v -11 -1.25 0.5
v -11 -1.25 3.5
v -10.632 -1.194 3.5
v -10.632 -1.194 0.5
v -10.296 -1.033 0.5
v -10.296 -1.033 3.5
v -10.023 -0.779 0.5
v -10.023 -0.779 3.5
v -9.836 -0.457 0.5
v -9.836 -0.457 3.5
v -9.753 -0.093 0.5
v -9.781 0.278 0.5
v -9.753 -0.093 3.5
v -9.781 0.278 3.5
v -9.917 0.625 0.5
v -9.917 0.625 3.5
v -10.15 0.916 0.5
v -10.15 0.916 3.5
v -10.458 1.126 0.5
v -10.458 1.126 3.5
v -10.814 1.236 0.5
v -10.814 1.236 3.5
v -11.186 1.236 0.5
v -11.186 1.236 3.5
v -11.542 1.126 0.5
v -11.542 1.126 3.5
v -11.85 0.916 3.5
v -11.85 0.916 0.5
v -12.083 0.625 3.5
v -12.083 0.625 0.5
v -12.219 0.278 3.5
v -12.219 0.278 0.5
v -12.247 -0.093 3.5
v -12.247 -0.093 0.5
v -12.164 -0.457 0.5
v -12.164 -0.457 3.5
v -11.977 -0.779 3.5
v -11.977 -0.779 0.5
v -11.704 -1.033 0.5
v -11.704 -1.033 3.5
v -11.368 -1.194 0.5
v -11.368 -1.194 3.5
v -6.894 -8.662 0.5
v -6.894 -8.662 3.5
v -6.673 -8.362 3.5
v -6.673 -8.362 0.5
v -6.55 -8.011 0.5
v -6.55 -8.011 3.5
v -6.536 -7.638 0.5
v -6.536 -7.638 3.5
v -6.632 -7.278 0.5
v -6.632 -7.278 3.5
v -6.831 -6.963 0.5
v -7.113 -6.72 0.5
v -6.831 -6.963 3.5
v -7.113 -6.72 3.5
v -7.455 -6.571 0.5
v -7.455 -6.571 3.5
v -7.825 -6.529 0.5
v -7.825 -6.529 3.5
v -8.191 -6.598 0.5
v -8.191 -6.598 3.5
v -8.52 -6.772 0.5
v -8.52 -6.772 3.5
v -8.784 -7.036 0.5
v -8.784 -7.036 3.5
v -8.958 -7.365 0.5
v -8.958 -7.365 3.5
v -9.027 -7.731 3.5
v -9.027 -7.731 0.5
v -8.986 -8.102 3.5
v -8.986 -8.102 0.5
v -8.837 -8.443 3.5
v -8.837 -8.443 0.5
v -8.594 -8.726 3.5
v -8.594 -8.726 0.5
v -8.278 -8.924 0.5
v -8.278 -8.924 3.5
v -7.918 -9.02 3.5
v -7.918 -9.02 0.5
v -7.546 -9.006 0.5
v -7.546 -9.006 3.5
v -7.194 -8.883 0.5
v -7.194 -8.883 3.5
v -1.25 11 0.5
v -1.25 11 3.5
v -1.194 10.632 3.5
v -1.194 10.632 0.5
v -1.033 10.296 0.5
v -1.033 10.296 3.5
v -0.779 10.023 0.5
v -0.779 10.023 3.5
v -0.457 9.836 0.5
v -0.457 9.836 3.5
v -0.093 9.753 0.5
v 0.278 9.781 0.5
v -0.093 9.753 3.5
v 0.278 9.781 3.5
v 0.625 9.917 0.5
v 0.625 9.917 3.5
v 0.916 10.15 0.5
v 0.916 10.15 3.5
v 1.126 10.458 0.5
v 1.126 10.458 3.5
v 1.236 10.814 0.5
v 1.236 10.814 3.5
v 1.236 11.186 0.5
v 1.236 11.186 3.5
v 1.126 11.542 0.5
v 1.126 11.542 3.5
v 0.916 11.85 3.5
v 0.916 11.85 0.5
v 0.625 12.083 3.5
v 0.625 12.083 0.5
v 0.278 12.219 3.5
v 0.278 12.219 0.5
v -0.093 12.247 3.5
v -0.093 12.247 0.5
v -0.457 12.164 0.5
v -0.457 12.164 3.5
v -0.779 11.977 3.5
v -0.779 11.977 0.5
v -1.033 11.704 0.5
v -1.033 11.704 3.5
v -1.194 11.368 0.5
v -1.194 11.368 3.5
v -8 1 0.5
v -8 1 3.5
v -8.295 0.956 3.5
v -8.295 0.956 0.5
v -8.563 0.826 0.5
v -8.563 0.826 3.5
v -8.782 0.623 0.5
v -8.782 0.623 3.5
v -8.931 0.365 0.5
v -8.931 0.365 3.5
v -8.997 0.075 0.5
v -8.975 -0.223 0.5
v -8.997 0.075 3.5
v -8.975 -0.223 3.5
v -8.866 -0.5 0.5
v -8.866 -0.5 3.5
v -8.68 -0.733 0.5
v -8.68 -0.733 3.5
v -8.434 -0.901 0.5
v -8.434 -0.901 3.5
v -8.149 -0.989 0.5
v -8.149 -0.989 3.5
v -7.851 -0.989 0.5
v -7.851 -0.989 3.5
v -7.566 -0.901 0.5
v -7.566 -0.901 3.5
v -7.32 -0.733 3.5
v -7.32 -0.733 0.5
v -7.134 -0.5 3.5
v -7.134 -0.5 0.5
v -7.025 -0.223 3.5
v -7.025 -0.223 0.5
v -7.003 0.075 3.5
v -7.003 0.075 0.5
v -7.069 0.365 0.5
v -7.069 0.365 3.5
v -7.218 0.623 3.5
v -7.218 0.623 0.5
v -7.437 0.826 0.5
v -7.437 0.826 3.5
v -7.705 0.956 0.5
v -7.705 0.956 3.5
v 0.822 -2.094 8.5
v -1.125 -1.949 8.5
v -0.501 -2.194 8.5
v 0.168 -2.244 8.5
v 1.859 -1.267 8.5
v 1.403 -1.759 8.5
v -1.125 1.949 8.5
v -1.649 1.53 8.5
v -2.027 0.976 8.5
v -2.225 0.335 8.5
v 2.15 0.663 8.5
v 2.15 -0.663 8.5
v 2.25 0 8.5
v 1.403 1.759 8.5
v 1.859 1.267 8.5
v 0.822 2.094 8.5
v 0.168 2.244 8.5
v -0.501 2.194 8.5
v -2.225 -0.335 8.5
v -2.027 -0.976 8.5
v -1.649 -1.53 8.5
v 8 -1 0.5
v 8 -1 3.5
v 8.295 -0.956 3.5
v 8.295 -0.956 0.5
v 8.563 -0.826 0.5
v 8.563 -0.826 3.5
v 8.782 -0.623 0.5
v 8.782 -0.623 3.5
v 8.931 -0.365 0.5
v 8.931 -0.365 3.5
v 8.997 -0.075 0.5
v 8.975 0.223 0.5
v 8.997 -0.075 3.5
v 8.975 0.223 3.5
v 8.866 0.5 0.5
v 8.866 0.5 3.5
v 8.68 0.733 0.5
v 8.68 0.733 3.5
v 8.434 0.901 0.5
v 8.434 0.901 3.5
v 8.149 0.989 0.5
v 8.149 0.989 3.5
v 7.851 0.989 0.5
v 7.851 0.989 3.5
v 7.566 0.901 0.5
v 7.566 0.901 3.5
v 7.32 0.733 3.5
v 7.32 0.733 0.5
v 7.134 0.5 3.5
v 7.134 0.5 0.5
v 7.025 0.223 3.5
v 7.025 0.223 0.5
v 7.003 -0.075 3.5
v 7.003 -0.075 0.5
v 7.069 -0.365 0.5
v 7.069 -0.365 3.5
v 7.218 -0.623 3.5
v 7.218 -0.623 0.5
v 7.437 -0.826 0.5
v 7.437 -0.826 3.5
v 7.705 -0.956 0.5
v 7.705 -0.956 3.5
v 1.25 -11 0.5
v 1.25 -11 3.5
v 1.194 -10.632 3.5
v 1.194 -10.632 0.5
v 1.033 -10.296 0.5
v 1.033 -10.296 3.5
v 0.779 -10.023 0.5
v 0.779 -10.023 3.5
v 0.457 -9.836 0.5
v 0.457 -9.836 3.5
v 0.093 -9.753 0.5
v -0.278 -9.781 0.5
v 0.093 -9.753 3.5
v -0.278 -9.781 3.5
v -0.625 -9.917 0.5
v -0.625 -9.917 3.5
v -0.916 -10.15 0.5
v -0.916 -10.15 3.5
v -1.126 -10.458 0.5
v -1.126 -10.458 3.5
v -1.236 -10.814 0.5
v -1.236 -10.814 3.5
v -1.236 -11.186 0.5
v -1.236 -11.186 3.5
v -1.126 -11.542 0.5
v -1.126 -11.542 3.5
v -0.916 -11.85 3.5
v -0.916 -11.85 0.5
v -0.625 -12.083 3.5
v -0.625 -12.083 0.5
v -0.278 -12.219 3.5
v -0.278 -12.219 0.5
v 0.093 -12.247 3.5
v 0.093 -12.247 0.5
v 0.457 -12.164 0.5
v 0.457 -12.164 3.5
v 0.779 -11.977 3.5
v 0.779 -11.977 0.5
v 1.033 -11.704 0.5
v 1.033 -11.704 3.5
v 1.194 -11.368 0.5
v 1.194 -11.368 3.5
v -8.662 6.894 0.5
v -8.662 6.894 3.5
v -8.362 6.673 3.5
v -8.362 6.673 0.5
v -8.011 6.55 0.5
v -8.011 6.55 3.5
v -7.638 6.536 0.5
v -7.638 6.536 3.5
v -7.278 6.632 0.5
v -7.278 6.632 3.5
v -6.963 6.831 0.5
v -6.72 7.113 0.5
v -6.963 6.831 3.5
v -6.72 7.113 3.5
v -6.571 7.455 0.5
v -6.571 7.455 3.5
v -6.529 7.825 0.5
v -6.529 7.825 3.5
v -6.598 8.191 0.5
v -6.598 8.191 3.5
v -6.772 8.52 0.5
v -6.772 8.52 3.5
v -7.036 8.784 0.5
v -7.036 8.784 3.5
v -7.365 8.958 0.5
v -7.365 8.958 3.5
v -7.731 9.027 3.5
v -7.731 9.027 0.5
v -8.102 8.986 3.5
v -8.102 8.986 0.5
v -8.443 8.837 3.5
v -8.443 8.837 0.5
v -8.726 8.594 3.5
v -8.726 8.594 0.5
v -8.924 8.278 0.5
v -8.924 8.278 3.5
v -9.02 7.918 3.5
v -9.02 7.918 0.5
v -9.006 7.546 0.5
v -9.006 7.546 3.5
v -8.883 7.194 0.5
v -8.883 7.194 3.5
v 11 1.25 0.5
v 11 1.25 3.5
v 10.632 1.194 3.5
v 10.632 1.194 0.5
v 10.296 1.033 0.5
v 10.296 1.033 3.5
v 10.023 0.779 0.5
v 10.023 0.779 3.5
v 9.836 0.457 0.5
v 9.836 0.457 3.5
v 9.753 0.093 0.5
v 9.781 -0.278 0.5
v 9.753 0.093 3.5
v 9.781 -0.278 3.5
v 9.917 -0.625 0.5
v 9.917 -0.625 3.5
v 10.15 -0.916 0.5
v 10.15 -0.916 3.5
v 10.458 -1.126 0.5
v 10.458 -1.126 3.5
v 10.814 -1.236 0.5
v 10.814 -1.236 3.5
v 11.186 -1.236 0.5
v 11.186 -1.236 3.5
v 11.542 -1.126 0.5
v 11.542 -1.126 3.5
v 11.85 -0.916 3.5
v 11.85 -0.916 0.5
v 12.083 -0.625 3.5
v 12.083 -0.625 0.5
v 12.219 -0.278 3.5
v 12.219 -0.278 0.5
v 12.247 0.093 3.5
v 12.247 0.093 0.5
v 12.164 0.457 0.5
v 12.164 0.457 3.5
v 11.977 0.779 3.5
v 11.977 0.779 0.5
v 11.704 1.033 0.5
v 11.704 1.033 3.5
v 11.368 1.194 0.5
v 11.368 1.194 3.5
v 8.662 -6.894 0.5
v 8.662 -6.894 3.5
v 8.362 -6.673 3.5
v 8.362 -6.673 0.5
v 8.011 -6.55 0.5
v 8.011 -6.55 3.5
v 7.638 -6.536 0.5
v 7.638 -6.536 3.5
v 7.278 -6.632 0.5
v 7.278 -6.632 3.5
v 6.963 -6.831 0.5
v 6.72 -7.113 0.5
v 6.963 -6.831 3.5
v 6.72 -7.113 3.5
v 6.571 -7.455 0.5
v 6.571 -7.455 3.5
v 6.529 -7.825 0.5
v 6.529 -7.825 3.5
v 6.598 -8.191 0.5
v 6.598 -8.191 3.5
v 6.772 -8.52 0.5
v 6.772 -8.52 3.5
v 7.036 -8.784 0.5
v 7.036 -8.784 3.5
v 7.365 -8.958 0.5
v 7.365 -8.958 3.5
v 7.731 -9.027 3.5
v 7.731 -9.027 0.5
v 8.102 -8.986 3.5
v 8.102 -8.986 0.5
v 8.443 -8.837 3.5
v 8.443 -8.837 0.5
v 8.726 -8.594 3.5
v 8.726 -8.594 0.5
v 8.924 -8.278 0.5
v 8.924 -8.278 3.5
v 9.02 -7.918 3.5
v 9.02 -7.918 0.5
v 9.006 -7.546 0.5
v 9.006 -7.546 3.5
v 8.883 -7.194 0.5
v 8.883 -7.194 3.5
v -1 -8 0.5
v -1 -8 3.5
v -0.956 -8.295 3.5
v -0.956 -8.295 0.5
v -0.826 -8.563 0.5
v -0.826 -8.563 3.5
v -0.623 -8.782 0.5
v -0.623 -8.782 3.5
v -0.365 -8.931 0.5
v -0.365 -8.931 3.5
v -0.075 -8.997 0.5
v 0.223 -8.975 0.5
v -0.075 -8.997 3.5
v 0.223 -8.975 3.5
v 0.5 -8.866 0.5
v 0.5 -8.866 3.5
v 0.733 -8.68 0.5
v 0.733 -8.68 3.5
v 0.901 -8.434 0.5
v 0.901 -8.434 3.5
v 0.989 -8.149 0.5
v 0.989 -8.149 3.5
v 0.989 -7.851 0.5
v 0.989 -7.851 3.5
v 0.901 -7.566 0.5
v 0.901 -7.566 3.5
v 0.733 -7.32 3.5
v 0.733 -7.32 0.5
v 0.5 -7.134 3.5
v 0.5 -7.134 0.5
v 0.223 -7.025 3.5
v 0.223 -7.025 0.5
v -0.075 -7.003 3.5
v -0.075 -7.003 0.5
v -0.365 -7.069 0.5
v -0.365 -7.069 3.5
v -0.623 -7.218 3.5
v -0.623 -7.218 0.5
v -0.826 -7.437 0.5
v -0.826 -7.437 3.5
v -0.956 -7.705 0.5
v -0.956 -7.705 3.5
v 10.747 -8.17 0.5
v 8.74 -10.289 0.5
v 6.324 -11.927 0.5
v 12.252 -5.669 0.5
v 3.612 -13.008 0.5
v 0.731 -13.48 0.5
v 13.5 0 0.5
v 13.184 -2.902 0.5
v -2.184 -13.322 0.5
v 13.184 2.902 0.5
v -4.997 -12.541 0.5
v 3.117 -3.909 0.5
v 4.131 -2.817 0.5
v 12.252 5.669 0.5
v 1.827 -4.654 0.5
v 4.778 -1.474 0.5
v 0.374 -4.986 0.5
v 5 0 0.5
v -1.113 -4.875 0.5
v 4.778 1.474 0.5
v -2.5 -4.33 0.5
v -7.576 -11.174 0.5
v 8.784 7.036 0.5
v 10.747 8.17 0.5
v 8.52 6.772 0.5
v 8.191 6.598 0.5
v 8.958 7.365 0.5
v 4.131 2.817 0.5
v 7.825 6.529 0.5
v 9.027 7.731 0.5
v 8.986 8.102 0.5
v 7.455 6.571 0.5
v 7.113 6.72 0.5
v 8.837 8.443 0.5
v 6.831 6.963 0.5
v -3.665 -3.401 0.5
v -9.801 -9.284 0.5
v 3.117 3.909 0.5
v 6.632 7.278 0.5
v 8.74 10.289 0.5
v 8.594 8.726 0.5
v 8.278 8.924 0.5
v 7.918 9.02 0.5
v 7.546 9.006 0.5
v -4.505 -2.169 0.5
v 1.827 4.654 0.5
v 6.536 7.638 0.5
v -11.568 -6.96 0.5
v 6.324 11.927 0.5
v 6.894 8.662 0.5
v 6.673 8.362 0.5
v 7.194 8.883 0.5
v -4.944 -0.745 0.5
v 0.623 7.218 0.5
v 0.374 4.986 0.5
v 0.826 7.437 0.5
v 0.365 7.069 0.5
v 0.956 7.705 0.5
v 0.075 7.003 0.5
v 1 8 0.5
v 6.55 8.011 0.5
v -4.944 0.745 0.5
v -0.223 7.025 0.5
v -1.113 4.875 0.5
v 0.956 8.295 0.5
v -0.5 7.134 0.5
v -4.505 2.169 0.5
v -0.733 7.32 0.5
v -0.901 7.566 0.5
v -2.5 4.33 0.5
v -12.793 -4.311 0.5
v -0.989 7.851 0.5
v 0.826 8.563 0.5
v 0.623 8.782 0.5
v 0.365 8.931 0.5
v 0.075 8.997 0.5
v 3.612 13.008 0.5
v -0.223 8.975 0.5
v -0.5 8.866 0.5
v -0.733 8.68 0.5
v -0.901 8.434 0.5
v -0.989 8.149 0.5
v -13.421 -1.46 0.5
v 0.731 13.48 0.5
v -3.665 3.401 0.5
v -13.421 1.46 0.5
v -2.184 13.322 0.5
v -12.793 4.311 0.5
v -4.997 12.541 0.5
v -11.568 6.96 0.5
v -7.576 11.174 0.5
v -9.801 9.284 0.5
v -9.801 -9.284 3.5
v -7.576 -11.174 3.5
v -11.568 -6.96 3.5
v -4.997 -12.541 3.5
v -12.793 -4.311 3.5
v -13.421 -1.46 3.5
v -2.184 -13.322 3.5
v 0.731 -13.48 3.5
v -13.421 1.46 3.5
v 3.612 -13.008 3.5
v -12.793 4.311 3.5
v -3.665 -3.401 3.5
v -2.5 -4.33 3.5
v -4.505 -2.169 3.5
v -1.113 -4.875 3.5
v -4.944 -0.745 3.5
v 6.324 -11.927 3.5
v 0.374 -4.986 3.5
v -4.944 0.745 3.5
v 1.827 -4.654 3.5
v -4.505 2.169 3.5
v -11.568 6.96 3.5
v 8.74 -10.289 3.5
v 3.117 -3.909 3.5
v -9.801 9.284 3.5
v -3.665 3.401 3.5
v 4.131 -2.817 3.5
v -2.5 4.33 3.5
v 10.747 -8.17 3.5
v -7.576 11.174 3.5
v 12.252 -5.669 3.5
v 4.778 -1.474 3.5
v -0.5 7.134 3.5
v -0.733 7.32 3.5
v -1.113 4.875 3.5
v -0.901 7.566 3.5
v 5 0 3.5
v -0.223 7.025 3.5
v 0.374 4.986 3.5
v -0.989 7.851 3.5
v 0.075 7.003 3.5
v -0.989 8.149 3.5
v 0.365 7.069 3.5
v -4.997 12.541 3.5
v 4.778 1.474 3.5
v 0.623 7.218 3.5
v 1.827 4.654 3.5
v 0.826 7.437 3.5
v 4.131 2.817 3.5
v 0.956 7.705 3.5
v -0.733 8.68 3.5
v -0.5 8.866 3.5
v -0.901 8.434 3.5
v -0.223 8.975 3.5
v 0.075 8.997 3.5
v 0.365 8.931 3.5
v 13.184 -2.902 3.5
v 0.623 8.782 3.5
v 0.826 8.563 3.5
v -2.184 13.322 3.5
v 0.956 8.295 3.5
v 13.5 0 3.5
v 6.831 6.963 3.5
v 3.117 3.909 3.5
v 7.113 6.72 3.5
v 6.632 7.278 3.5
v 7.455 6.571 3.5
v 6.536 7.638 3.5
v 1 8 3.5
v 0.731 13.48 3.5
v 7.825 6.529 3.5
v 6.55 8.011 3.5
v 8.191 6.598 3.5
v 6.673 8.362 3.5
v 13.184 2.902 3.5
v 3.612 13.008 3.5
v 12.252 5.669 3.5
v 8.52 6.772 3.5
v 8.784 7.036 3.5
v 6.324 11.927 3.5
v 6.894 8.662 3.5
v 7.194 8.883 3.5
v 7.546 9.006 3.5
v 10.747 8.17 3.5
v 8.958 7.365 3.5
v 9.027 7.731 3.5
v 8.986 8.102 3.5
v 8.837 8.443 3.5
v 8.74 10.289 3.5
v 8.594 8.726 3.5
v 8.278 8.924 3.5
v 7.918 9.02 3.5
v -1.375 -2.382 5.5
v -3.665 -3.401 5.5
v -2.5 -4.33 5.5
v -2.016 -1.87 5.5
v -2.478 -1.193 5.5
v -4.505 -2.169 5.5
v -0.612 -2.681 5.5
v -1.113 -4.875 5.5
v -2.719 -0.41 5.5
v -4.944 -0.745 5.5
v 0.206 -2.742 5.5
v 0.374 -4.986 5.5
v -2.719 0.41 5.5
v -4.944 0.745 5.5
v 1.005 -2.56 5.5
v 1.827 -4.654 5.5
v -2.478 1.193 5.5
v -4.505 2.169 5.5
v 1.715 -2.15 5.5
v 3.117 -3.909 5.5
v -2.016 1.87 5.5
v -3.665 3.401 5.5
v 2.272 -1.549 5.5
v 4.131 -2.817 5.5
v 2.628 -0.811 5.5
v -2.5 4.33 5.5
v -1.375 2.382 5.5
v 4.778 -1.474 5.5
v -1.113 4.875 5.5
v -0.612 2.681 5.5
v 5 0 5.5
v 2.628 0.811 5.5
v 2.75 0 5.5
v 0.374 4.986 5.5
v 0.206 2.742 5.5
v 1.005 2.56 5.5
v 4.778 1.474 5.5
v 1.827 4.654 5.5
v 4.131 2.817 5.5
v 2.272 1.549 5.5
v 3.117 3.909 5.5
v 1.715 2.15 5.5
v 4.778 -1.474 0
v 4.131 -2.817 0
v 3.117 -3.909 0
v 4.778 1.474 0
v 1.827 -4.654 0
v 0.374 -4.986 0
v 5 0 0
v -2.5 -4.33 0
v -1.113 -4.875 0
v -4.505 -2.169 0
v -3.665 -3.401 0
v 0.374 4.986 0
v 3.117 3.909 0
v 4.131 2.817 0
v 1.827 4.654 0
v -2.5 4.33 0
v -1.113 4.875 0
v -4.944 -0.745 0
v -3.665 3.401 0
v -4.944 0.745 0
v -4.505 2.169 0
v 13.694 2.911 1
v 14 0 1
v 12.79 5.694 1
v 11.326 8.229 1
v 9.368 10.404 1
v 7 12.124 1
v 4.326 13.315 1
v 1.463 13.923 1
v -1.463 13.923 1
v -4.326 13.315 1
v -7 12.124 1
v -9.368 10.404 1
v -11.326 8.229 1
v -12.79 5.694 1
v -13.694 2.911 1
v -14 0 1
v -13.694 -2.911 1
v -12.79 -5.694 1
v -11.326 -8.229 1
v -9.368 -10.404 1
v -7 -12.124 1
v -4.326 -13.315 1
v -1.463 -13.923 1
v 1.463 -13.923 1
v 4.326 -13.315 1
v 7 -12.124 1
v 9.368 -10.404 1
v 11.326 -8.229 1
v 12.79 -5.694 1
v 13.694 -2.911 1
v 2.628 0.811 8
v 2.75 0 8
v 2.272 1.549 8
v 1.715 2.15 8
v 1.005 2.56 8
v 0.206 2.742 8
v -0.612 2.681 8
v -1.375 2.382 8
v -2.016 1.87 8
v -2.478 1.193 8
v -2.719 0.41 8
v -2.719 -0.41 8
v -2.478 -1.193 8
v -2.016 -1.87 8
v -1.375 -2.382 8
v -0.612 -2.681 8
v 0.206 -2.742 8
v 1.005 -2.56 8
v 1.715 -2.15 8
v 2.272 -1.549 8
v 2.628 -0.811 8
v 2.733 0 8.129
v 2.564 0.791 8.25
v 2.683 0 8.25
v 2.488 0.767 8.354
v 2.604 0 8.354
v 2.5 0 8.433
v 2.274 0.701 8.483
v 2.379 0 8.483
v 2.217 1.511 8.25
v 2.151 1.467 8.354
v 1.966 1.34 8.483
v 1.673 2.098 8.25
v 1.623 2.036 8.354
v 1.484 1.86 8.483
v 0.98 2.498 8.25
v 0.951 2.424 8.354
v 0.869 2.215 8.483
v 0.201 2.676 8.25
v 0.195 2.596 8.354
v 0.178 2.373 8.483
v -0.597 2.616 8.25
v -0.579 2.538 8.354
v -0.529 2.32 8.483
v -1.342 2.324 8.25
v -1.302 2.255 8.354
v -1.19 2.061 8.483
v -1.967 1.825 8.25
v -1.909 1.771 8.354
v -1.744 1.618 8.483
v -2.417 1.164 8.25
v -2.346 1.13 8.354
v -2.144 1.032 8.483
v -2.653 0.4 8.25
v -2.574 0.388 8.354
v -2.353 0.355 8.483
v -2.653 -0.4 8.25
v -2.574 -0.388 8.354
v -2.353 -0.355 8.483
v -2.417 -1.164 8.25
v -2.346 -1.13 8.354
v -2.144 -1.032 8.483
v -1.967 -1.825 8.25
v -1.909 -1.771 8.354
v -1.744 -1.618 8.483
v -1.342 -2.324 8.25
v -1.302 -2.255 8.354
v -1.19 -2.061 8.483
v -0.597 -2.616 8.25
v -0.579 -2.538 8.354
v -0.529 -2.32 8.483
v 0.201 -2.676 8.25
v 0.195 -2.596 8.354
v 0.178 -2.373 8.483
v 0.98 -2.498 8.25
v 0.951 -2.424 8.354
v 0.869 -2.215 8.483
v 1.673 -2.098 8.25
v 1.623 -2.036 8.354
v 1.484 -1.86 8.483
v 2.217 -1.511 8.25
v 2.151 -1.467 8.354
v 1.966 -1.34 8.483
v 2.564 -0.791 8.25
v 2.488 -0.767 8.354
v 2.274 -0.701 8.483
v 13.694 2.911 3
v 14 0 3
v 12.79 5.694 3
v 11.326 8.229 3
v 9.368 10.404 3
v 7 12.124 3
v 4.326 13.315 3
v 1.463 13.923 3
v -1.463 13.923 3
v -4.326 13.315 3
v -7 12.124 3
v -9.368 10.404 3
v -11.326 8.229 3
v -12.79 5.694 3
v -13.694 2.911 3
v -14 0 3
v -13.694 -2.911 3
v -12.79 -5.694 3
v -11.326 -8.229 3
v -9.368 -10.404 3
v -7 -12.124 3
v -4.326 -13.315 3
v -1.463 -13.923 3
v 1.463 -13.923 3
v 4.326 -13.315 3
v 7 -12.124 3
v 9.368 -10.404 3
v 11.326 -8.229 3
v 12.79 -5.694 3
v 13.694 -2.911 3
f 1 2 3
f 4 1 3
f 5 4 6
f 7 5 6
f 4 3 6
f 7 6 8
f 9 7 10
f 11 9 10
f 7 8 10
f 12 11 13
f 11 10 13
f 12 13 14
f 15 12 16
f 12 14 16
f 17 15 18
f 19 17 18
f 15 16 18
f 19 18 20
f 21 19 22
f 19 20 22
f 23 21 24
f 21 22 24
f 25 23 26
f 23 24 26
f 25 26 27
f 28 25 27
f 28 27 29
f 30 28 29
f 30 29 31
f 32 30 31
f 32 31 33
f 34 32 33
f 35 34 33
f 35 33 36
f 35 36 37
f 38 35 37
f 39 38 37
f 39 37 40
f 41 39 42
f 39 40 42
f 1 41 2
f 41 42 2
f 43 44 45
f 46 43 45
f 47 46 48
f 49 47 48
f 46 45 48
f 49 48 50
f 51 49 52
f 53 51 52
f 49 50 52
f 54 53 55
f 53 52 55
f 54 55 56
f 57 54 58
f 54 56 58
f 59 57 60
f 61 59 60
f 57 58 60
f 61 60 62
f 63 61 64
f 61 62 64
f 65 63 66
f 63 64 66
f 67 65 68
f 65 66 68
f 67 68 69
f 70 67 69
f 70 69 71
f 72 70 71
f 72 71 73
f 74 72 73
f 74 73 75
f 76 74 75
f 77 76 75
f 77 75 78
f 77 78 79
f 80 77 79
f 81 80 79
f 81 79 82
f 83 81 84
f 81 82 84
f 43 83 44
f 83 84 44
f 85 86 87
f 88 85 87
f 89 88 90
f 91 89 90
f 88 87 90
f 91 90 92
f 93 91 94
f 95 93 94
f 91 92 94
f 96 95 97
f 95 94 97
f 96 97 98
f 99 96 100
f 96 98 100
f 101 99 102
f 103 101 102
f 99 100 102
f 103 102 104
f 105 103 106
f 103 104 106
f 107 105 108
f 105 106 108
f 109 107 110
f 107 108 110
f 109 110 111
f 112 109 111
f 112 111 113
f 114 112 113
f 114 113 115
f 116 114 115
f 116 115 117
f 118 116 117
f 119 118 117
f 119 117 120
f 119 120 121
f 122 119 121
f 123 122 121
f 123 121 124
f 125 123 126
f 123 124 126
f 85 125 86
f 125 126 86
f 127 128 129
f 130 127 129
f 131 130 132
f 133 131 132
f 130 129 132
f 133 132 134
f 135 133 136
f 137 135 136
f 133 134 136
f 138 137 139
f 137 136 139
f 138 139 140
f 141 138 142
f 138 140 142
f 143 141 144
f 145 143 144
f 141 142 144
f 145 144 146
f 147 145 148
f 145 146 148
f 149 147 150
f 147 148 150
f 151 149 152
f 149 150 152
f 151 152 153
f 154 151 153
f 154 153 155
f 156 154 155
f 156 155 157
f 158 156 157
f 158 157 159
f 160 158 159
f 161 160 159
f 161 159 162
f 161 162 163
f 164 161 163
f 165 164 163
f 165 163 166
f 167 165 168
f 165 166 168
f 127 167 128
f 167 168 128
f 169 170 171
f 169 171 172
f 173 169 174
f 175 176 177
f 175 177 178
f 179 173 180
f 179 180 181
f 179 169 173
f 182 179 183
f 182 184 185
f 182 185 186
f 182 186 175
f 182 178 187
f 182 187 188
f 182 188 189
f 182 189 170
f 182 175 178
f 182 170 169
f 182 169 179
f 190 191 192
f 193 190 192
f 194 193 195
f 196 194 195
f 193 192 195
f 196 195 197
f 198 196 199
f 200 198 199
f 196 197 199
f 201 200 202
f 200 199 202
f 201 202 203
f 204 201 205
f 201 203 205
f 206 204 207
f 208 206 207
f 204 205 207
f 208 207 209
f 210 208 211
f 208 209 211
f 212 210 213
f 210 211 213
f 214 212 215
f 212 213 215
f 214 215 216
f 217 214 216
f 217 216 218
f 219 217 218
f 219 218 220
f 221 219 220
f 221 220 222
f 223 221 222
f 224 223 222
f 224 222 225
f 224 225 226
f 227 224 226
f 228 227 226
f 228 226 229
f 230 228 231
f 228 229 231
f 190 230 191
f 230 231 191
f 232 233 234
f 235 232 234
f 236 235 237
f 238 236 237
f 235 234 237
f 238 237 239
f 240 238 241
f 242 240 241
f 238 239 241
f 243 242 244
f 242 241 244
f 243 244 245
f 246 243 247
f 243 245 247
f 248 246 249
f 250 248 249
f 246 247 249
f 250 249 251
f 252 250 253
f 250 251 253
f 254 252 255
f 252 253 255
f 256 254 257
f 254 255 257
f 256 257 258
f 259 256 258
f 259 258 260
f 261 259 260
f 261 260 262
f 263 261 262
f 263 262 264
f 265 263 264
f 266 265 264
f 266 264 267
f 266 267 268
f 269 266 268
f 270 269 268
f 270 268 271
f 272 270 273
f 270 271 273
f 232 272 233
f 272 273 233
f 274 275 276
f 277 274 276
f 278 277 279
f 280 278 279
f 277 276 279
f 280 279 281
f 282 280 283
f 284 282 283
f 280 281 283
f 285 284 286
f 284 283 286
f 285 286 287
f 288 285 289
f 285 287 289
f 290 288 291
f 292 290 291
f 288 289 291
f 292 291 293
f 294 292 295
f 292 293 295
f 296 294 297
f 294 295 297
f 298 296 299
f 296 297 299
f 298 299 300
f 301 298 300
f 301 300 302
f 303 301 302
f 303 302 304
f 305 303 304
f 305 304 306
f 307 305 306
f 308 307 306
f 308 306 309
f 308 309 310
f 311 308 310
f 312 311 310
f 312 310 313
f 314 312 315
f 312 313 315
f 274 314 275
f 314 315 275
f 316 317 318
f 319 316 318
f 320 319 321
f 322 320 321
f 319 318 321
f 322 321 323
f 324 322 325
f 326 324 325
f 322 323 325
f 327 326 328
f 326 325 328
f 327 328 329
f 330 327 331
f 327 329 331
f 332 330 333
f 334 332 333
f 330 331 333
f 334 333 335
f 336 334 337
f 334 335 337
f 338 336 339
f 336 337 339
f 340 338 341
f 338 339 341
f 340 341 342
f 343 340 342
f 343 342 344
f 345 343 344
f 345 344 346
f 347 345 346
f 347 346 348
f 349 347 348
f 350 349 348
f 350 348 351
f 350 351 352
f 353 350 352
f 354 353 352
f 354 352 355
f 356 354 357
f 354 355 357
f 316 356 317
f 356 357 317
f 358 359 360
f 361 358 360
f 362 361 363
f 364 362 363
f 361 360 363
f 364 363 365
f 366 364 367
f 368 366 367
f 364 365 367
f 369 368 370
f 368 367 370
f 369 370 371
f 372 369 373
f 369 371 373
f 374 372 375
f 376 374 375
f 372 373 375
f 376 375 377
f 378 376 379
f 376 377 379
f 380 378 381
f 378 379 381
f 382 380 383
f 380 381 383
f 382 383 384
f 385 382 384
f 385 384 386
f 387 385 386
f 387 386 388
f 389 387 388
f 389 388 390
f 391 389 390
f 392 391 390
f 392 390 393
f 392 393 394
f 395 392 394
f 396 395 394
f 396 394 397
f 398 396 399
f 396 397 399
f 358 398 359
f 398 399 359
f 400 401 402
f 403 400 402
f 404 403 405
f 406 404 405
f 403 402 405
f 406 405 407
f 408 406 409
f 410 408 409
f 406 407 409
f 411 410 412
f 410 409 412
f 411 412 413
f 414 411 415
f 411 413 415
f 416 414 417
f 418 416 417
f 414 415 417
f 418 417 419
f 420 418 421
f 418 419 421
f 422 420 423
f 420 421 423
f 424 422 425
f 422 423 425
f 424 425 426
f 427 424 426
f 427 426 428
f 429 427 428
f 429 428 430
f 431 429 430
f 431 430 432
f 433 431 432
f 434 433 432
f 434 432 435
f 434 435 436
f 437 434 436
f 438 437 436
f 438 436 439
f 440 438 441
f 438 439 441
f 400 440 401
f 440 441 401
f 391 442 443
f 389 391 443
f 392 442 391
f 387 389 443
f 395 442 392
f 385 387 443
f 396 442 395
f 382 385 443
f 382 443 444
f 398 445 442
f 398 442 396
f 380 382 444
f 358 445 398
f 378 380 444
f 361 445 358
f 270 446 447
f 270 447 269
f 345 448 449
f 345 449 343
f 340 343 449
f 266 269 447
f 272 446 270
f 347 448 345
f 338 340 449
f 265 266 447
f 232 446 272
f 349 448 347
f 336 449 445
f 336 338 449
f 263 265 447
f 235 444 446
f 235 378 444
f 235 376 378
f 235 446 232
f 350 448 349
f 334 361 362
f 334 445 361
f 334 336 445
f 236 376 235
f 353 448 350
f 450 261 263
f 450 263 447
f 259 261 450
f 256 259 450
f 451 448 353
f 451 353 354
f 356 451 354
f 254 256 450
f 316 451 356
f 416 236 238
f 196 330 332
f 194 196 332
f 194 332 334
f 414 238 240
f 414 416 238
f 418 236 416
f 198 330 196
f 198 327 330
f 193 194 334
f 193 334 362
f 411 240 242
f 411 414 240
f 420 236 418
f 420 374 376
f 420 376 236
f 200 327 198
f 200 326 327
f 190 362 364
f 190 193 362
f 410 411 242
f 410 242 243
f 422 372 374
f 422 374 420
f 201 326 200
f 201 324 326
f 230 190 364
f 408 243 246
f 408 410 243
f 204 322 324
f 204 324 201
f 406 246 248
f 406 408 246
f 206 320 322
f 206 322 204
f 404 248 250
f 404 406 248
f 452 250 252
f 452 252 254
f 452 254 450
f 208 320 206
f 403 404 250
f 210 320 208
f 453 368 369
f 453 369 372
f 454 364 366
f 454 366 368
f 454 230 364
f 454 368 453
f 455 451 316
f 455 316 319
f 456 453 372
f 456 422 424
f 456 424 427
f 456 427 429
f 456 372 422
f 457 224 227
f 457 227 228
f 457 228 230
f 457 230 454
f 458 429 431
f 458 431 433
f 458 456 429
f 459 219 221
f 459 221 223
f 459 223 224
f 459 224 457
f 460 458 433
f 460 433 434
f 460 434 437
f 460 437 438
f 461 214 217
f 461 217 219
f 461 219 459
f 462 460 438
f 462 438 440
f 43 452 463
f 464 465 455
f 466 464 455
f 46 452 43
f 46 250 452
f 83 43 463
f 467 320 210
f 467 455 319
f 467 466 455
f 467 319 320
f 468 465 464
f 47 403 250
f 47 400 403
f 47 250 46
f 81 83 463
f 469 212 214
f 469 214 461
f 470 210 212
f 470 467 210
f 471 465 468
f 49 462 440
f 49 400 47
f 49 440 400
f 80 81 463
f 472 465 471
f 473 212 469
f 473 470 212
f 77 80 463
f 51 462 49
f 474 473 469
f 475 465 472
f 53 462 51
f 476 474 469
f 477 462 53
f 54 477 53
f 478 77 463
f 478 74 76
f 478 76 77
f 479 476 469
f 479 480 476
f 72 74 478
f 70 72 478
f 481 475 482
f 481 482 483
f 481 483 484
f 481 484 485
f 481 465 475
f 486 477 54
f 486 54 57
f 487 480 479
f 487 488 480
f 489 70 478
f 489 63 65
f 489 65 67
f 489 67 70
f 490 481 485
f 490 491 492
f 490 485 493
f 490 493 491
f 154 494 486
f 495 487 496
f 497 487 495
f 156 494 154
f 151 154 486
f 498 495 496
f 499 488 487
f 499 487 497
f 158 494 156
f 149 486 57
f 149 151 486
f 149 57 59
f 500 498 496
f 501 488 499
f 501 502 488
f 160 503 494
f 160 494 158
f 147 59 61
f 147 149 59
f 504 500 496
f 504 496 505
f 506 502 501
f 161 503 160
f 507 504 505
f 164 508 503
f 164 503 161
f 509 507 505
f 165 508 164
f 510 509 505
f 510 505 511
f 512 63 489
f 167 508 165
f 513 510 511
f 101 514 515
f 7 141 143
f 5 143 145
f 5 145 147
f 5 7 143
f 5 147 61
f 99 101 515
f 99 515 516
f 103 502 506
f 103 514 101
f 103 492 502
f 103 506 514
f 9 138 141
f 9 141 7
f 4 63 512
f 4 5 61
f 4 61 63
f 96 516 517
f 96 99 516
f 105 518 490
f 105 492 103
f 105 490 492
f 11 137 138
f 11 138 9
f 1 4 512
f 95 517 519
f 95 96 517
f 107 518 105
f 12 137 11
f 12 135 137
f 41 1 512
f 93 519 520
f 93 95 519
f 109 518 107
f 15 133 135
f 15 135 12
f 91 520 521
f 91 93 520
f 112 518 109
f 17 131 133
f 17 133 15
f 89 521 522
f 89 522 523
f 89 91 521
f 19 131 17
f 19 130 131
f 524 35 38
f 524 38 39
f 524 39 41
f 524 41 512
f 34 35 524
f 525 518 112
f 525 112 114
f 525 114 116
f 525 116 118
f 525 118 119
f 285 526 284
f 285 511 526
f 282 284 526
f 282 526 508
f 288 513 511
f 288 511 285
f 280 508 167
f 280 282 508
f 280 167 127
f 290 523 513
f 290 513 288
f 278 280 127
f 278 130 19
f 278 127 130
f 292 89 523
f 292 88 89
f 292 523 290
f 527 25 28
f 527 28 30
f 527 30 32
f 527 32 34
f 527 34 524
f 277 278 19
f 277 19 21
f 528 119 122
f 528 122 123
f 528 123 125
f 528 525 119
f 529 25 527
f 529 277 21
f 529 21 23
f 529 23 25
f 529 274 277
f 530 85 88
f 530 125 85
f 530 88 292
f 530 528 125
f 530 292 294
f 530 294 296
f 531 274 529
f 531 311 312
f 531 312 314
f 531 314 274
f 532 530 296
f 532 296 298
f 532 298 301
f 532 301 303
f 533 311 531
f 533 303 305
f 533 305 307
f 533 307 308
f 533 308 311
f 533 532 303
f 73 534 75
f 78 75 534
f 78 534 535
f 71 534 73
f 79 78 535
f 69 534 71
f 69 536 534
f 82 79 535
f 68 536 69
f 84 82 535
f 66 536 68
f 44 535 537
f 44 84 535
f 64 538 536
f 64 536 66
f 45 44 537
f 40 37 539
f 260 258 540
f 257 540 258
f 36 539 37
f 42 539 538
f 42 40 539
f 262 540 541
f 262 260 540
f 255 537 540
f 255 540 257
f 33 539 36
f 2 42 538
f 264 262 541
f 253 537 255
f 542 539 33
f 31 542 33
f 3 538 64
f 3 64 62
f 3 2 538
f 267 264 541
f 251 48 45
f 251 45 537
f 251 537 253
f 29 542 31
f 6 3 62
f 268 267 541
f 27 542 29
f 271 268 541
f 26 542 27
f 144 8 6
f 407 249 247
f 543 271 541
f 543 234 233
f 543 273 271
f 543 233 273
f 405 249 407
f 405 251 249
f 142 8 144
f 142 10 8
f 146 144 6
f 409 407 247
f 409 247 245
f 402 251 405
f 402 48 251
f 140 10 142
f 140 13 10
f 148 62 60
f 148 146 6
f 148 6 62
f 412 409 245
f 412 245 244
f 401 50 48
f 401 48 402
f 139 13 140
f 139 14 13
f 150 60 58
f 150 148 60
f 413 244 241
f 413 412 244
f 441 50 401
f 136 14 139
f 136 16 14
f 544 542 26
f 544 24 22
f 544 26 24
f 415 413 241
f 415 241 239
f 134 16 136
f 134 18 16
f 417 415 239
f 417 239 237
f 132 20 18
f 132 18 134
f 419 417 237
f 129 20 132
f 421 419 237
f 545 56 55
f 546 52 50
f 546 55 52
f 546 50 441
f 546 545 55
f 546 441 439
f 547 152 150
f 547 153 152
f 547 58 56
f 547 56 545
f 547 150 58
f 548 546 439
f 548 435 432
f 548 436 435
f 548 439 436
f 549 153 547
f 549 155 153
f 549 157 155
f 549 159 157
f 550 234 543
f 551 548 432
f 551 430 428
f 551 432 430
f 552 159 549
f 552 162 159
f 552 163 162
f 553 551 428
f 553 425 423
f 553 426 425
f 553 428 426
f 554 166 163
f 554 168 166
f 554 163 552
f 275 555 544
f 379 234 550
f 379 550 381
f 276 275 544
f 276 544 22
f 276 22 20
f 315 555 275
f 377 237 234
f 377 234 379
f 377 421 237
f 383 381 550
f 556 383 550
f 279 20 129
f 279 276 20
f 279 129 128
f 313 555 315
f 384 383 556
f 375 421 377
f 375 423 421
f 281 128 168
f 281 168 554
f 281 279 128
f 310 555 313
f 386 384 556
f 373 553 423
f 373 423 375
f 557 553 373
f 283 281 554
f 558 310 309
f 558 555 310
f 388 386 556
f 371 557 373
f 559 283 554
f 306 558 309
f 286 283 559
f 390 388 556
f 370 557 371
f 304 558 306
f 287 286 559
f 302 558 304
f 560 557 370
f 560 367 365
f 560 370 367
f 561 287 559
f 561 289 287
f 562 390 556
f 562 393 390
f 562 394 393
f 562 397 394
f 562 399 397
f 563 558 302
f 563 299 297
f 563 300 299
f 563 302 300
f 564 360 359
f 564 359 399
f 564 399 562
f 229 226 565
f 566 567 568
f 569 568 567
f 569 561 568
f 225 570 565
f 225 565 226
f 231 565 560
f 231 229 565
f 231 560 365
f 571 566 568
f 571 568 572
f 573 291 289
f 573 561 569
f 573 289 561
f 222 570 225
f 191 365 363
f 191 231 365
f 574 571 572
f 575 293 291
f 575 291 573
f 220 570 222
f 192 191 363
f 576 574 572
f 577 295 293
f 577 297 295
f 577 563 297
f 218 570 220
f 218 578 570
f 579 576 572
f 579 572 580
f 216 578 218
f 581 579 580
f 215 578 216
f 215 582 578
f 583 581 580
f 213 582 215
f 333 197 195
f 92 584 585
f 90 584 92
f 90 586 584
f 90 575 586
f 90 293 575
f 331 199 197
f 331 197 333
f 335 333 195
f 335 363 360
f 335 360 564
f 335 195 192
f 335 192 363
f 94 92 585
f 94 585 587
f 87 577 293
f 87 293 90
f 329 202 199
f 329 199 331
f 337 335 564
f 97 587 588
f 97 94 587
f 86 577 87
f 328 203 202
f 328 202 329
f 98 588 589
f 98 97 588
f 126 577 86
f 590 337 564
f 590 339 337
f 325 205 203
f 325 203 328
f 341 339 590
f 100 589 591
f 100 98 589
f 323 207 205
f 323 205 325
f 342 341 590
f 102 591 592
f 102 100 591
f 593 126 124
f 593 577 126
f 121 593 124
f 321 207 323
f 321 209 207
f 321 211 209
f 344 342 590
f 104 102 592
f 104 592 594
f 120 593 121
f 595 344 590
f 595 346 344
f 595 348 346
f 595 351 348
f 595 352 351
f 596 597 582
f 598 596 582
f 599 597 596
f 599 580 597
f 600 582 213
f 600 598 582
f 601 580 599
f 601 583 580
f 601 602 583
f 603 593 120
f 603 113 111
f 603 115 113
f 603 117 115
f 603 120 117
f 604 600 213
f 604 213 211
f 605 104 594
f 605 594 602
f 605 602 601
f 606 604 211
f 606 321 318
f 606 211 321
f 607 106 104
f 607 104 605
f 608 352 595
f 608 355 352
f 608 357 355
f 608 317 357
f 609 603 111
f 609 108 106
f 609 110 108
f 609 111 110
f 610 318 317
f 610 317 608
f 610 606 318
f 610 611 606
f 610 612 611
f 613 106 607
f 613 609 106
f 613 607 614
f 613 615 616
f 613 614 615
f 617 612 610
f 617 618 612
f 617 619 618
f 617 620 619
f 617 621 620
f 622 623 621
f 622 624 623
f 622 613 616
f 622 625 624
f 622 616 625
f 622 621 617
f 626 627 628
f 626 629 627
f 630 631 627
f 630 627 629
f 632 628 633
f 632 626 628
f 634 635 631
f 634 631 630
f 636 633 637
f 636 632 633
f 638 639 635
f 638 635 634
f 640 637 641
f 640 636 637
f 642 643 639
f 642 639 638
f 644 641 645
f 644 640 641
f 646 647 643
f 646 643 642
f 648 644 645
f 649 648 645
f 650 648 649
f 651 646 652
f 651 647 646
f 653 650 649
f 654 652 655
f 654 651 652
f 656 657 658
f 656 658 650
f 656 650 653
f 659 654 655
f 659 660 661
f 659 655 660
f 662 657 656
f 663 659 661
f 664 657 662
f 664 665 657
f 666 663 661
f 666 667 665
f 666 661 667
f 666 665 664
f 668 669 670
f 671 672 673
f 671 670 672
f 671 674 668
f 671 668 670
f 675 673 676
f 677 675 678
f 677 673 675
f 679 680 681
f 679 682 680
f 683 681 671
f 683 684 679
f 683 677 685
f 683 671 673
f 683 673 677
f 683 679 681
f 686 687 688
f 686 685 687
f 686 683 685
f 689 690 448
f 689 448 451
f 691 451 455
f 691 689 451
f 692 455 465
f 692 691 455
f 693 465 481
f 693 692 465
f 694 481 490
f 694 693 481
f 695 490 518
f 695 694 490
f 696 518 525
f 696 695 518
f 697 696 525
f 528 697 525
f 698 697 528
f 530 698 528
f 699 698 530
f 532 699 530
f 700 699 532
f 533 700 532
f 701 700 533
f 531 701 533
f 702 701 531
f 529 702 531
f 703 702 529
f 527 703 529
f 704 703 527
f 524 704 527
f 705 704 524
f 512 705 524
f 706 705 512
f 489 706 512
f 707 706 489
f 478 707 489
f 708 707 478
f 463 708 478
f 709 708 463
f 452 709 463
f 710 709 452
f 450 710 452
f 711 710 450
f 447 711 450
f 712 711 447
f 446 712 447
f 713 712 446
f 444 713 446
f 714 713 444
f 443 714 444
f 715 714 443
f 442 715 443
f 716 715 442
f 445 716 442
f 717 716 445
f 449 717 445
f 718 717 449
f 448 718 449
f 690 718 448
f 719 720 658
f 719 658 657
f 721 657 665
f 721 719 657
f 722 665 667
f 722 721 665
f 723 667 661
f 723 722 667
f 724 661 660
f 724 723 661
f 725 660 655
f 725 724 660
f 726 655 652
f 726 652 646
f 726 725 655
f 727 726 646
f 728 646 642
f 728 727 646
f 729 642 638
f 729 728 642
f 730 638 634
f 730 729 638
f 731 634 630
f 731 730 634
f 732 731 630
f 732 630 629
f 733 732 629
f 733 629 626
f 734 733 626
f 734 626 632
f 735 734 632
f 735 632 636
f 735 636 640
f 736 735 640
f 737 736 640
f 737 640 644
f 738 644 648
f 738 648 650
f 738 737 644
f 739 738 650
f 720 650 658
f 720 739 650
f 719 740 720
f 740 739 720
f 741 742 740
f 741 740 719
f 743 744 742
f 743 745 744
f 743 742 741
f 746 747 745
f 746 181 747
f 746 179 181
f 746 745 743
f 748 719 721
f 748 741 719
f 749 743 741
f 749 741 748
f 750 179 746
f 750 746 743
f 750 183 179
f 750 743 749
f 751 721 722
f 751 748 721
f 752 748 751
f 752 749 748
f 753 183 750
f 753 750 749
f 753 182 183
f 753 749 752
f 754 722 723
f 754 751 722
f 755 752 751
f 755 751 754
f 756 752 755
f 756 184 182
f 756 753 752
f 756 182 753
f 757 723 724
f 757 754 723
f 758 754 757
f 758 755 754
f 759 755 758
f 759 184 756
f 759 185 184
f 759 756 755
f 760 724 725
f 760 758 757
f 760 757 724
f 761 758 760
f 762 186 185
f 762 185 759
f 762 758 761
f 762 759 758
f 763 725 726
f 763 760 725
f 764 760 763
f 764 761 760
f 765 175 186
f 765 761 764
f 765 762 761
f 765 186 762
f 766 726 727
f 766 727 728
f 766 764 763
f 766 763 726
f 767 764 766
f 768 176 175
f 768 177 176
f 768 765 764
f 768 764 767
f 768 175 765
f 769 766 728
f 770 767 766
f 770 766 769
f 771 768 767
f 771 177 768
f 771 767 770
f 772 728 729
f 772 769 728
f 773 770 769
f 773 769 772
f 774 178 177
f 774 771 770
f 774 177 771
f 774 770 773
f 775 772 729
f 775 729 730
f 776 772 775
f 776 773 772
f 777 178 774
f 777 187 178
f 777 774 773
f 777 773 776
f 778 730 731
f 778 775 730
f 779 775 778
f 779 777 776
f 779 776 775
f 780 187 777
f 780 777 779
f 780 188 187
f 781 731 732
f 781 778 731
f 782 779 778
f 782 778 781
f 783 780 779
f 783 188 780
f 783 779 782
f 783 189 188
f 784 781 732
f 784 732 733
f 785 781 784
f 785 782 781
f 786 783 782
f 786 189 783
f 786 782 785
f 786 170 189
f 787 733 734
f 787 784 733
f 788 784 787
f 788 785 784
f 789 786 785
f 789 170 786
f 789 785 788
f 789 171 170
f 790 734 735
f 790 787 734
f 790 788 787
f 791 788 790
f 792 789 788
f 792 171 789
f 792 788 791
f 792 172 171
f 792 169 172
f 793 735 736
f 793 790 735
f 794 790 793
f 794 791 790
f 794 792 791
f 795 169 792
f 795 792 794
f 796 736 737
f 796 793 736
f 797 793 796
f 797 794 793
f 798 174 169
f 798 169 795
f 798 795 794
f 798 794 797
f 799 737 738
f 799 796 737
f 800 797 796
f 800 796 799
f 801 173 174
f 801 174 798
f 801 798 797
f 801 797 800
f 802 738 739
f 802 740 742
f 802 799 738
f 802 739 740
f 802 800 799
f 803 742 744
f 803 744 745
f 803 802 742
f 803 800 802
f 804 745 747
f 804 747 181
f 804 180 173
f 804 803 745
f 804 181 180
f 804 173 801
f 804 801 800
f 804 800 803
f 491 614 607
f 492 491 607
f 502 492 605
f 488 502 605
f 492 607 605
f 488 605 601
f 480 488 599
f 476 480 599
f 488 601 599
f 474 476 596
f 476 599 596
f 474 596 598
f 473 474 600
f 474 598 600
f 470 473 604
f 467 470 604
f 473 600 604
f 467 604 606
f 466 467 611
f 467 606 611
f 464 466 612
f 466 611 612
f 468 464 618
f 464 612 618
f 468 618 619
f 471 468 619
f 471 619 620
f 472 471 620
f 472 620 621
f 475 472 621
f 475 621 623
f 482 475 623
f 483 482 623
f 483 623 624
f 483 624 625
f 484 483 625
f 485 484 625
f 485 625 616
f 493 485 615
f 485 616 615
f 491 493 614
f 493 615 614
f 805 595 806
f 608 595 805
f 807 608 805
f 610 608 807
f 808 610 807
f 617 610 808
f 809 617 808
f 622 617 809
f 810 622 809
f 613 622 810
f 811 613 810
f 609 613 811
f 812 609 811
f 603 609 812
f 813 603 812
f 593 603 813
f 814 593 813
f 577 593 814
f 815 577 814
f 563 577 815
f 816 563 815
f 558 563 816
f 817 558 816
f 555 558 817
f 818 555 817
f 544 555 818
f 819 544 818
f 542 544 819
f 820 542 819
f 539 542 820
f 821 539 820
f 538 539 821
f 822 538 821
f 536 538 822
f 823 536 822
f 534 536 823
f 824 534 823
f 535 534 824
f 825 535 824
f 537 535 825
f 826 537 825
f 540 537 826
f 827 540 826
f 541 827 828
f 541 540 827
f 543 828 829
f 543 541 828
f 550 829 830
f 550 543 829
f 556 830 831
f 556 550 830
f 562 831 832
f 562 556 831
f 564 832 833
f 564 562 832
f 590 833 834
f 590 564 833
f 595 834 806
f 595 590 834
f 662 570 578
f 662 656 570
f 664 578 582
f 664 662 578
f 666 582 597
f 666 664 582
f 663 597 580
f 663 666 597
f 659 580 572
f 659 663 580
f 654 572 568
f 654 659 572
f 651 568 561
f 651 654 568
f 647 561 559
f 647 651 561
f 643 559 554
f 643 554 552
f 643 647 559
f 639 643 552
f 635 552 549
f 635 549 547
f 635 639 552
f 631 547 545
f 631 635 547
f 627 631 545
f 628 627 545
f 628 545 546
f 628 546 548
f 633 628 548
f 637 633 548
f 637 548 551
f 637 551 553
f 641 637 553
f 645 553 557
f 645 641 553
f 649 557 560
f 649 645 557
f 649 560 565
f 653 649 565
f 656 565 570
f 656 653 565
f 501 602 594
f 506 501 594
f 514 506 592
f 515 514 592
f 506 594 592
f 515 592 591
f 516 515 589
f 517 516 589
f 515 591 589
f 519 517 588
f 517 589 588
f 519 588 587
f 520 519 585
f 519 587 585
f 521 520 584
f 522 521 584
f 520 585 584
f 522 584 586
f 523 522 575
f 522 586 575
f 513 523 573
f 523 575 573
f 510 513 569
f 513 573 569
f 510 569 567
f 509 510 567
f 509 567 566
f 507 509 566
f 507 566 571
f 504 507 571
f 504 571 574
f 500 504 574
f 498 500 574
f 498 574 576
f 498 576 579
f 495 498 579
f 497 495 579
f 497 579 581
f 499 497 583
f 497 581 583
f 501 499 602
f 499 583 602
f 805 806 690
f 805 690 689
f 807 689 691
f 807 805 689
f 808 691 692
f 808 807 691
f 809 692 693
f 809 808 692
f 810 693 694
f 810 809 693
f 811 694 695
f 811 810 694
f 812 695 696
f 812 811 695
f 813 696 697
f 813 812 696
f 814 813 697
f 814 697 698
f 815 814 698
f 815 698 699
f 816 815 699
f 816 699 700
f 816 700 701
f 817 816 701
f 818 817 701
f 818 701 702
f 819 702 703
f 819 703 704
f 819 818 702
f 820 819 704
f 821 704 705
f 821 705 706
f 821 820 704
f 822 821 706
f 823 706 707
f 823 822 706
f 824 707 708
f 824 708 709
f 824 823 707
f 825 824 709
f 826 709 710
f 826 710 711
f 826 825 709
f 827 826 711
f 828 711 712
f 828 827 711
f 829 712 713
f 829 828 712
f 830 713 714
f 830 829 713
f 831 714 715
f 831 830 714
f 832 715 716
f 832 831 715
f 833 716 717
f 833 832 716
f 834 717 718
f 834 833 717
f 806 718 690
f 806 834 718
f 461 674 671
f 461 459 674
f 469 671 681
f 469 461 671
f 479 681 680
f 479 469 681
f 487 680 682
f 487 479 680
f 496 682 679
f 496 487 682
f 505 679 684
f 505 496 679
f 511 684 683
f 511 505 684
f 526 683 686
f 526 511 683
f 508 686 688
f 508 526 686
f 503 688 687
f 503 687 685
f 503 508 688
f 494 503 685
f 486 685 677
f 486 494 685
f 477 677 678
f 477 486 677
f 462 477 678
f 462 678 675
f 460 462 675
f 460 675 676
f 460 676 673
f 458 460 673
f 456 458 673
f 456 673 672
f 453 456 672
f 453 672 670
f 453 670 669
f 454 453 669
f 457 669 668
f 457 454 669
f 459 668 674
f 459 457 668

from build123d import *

# Parameters (mm, degrees)
SKETCH017_R           = 1.25
POCKET_DEPTH          = 3
POLARPATTERN_COUNT    = 8
SKETCH018_R           = 1
POCKET001_DEPTH       = 3
POLARPATTERN001_COUNT = 4
CHAMFER_SIZE          = 0.5
FILLET005_R           = 0.5


with BuildPart() as part:
    # Sketch016 → Revolution003 (revolve)
    with BuildSketch(Plane.XZ):
        Polygon((0, 0), (5, 0), (5, 0.5), (14, 0.5), (14, 3.5), (5, 3.5), (5, 5.5), (2.75, 5.5), (2.75, 8.5), (0, 8.5), align=None)
    revolve(axis=Axis((0, 0, 0), (0, 0, 1)))

    # Sketch017 (on Face5 of Revolution003) → Pocket (cut)
    with BuildSketch(Plane(origin=(0, 0, 3.5), x_dir=(-1, 0, 0), z_dir=(0, 0, 1))):
        with Locations((0, -11)):
            Circle(SKETCH017_R)
    pocket = extrude(amount=-POCKET_DEPTH, mode=Mode.SUBTRACT)

    # PolarPattern: Pocket ×8 about axis
    polarpattern_axis = Axis((0, 0, 3.5), (0, 0, 1))
    for i in range(1, POLARPATTERN_COUNT):
        add(pocket.rotate(polarpattern_axis, i * 360 / POLARPATTERN_COUNT), mode=Mode.SUBTRACT)

    # Sketch018 (on Face13 of PolarPattern) → Pocket001 (cut)
    with BuildSketch(Plane(origin=(0, 0, 3.5), x_dir=(-1, 0, 0), z_dir=(0, 0, 1))):
        with Locations((0, 8)):
            Circle(SKETCH018_R)
    pocket001 = extrude(amount=-POCKET001_DEPTH, mode=Mode.SUBTRACT)

    # PolarPattern001: Pocket001 ×4 about axis
    polarpattern001_axis = Axis((0, 0, 3.5), (0, 0, 1))
    for i in range(1, POLARPATTERN001_COUNT):
        add(pocket001.rotate(polarpattern001_axis, i * 360 / POLARPATTERN001_COUNT), mode=Mode.SUBTRACT)

    # Chamfer
    chamfer_edges = [part.edges().sort_by_distance(p)[0] for p in [
        (-14, 0, 3.5),
        (-14, 0, 0.5),
    ]]
    chamfer(chamfer_edges, length=CHAMFER_SIZE)

    # Fillet005
    fillet005_edges = [part.edges().sort_by_distance(p)[0] for p in [
        (-2.75, 0, 8.5),
    ]]
    fillet(fillet005_edges, radius=FILLET005_R)


solid = part.part
